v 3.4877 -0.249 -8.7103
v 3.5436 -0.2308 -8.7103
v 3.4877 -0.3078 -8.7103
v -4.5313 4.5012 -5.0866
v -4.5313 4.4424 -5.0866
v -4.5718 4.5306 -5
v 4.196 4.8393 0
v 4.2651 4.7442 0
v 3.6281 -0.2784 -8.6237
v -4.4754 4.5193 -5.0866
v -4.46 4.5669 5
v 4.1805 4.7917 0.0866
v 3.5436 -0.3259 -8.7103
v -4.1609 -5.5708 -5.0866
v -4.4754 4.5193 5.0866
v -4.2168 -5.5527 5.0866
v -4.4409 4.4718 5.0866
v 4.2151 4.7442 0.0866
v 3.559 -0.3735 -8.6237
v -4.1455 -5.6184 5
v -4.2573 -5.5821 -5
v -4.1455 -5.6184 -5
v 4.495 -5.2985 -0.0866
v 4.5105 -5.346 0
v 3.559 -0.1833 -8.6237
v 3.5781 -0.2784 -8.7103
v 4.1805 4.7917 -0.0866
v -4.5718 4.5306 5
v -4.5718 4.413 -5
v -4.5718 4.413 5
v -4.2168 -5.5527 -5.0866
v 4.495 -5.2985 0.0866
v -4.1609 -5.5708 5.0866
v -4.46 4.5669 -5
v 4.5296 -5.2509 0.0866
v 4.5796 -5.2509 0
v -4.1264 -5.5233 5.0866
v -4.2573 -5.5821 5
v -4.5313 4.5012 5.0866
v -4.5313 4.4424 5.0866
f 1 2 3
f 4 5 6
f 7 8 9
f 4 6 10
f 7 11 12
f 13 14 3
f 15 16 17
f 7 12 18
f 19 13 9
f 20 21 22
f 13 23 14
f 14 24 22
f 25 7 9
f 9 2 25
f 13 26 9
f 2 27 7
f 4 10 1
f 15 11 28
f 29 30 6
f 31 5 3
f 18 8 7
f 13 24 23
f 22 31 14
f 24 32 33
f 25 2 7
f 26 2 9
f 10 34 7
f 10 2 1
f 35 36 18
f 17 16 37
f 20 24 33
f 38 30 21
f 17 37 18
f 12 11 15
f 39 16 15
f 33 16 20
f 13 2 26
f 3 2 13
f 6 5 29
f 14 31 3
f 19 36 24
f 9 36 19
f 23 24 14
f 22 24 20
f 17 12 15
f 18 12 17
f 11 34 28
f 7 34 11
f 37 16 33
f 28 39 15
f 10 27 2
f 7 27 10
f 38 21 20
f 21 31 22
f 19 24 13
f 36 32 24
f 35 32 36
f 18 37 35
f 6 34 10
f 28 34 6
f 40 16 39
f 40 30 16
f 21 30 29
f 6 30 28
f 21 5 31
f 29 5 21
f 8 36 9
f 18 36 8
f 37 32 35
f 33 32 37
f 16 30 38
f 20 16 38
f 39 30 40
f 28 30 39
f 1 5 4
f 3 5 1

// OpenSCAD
// Auto-generated OpenSCAD file

    inner_points = 10*[[0.4479590588990513, -0.5250898206093074, -7.05324687544362e-13], [0.4165075656405067, 0.4744154588023662, 2.0339285811132868e-13], [-0.417637904288353, -0.5523276127577147, -0.5000000000003288], [-0.44908939754689753, 0.44717766665395897, -0.49999999999942013], [-0.41763790428788994, -0.5523276127586092, 0.49999999999967115], [-0.44908939754643434, 0.44717766665306447, 0.5000000000005798], [0.352813311127668, -0.027836294896346484, -0.862372435696011]];

    outer_points = 10*[[0.26573559772755095, 0.3038927930034916, 0.6483572285355131], [-0.6597836115012342, 0.2731852040296694, 0.2709036057844004], [0.6433673075177818, 0.3038927930034916, -0.27759865149382545], [-0.28215190171100324, 0.2731852040296694, -0.6550522742449382], [0.47917590859784487, -0.5617242025462499, 0.1954218570849814], [-0.4463433006309402, -0.5924317915200721, -0.18203176566613136], [-0.028313936102664725, 0.9953123157758751, -0.01154724575106305]];

    // Convex hull for inner set (I)
    module inner_hull() {
        hull() {
            for (p = inner_points) {
                translate(p) sphere(r=0.1);
            }
        }
    }

    // Convex hull for outer set (O) minus inner hull (O \ I)
    module outer_minus_inner() {
        difference() {
            hull() {
                for (p = outer_points) {
                    translate(p) sphere(r=0.1);
                }
            }
            inner_hull(); // Subtract inner hull
        }
    }

    // Convex hull for outer set (O) minus all translated inner hulls
    module outer_minus_AllTranslationInner() {
        difference() {
            hull() {
                for (p = outer_points) {
                    translate(p) sphere(r=0.1);
                }
            }
            hull() {
                translate([0,0,50]) inner_hull();
                translate([0,0,-50]) inner_hull();
            }; // Subtract translated inner hulls
        }
    }

    // Difference between outer_minus_inner and outer_minus_AllTranslationInner
    module outer_minus_inner_diff() {
        difference() {
            // Outer minus inner
            difference() {
                hull() {
                    for (p = outer_points) {
                        translate(p) sphere(r=0.1);
                    }
                }
                inner_hull();
            }

            // Subtract Outer minus AllTranslationInner
            difference() {
                hull() {
                    for (p = outer_points) {
                        translate(p) sphere(r=0.1);
                    }
                }
                hull() {
                    translate([0,0,50]) inner_hull();
                    translate([0,0,-50]) inner_hull();
                };
            }
        }
    }

    // Rendering all with colors applied
    color([1, 0, 0, 0.5]) inner_hull(); // Transparent red
    
